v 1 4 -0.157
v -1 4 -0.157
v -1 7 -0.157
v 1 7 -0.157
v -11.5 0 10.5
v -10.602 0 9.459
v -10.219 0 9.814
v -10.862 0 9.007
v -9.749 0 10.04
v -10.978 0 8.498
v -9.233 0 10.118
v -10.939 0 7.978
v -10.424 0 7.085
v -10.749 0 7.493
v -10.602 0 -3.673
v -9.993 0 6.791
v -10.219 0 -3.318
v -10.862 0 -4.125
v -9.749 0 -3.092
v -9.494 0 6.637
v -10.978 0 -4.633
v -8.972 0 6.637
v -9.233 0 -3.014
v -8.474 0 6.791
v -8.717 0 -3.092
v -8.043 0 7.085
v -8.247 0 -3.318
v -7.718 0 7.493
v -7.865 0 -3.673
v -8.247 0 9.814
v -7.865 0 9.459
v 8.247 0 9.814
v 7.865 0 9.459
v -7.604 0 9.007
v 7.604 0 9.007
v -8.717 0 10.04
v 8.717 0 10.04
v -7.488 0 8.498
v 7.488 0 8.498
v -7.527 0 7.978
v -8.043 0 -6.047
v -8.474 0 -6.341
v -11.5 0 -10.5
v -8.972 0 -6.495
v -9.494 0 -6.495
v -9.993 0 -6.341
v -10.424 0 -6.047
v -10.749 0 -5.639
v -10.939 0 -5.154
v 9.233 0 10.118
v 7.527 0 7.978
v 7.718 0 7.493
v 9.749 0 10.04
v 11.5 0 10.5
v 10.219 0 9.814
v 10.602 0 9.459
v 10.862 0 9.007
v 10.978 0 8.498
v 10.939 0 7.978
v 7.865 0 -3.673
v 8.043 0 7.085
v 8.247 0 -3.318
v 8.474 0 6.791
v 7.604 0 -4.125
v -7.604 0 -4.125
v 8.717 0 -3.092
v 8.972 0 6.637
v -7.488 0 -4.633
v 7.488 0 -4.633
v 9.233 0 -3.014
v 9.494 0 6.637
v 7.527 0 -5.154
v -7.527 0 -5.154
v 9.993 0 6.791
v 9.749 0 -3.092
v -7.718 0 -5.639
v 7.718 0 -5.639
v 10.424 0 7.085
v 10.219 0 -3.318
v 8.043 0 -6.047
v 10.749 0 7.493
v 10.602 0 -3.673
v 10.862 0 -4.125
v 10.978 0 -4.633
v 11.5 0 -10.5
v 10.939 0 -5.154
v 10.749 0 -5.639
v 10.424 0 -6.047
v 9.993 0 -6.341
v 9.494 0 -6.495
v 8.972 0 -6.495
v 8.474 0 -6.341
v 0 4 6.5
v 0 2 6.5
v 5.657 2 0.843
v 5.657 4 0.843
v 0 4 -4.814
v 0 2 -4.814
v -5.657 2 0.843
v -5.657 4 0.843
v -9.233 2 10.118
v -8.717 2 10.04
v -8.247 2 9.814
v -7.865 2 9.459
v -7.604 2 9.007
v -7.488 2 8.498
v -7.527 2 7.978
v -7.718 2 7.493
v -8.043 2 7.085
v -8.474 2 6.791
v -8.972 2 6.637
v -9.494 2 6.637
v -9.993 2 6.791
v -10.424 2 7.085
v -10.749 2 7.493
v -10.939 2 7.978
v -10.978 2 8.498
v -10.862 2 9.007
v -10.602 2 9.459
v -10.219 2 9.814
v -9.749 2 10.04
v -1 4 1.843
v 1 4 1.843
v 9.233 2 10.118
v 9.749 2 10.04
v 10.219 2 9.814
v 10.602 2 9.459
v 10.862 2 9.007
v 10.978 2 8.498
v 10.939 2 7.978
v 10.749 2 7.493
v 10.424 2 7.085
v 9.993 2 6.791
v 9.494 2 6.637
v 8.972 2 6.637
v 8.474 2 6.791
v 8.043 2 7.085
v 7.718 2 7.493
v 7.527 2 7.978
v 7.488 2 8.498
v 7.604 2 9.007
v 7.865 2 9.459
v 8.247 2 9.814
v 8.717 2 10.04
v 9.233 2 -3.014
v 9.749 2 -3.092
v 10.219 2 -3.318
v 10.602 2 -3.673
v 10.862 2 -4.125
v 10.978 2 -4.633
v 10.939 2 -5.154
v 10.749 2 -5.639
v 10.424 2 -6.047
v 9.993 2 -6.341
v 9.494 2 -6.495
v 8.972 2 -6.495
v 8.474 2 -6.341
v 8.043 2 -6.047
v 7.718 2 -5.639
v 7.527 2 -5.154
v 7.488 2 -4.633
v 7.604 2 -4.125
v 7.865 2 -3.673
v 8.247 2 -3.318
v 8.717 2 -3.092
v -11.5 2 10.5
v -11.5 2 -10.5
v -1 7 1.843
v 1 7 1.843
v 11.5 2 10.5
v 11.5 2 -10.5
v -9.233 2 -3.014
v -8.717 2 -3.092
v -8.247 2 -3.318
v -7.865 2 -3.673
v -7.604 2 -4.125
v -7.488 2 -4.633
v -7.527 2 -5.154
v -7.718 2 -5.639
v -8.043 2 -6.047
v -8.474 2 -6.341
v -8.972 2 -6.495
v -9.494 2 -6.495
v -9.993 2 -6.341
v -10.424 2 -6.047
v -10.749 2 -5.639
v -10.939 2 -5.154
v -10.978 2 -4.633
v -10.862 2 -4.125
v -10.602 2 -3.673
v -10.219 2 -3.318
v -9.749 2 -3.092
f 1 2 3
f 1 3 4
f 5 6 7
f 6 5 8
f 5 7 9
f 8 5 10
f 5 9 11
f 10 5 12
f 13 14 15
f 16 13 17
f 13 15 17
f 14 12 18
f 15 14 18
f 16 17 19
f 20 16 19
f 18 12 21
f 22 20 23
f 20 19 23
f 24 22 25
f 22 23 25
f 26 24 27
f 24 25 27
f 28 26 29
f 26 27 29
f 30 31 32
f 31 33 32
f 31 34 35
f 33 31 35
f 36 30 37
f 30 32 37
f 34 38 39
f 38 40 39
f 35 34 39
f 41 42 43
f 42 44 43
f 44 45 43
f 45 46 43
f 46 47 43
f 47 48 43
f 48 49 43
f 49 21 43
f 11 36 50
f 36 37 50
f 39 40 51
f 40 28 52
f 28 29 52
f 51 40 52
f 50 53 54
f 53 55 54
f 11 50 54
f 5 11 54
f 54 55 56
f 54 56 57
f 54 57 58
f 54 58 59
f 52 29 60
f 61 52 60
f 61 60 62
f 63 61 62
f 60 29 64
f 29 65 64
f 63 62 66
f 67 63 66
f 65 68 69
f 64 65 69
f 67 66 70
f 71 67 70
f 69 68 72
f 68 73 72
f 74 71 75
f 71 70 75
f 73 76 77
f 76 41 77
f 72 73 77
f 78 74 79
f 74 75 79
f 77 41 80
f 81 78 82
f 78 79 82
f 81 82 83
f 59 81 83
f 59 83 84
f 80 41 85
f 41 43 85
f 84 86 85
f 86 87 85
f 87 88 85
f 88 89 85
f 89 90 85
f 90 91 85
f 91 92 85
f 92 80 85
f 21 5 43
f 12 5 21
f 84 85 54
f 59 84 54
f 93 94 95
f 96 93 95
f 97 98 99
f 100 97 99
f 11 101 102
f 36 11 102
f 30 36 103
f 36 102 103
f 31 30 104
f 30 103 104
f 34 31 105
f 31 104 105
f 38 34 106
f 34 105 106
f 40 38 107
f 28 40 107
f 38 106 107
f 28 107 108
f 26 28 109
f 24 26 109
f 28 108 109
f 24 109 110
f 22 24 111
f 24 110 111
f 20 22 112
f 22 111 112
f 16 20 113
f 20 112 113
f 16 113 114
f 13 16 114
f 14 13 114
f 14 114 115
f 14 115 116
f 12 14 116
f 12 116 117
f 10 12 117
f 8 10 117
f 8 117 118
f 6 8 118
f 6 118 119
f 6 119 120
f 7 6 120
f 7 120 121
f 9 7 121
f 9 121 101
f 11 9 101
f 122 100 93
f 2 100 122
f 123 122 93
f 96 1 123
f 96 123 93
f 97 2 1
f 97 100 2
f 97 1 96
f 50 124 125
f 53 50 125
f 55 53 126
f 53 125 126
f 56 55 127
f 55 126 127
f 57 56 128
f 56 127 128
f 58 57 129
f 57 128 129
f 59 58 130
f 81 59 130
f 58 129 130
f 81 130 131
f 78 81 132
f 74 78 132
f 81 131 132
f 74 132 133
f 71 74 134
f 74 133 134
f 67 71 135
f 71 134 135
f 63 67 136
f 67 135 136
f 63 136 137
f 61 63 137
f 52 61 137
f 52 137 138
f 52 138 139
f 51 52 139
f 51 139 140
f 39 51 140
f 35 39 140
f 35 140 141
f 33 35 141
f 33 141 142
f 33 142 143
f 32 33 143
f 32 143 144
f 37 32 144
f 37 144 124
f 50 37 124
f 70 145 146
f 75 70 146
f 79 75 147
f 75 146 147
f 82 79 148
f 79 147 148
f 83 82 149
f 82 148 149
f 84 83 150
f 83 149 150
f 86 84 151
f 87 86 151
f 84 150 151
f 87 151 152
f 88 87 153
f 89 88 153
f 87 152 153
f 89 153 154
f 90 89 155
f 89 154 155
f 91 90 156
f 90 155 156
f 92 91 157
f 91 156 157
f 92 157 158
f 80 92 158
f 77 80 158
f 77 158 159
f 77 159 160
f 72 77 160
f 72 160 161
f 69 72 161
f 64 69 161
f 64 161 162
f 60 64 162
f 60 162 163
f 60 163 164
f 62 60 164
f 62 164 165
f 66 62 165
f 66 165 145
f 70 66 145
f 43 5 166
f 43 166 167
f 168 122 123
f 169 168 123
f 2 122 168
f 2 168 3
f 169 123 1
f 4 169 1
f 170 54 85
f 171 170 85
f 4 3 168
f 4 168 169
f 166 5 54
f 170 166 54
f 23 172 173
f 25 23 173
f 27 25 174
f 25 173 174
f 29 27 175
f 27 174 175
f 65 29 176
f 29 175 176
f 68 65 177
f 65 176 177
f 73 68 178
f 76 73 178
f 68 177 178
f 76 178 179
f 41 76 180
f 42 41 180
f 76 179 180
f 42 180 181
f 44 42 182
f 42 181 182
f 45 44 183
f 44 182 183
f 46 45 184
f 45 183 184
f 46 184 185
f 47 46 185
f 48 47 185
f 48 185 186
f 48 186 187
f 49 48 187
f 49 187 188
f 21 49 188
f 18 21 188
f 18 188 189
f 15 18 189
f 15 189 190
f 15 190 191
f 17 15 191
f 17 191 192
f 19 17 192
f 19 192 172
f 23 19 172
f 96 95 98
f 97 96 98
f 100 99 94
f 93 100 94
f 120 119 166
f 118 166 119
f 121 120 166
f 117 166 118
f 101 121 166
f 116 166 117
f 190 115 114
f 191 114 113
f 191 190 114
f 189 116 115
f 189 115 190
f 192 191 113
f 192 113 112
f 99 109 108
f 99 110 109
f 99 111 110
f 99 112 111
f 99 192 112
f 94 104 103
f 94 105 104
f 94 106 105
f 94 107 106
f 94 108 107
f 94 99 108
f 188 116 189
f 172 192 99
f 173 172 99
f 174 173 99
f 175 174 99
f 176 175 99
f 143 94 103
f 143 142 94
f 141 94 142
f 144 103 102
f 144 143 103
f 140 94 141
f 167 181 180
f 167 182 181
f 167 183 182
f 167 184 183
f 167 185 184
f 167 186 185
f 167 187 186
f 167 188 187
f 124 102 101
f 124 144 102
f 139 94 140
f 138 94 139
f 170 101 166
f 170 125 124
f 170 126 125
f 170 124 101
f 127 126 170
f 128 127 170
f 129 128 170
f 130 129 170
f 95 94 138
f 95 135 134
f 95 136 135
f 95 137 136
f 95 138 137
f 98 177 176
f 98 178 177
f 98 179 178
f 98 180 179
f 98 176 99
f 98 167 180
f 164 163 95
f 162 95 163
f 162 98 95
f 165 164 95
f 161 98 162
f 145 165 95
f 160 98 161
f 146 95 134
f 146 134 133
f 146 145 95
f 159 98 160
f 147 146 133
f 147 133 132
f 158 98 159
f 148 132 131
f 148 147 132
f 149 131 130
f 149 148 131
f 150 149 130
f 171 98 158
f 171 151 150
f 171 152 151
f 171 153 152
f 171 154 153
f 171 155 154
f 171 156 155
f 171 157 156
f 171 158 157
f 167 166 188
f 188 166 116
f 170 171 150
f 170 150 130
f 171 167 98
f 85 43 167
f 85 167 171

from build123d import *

# Parameters (mm, degrees)
SKETCH1_W           = 23
SKETCH1_H           = 21
BOSS_EXTRUDE1_DEPTH = 2
SKETCH2_R           = 1.75
CUT_EXTRUDE1_DEPTH  = 16.700318468
BOSS_EXTRUDE2_DEPTH = 2
SKETCH4_W           = 2
SKETCH4_H           = 2
BOSS_EXTRUDE3_DEPTH = 3


with BuildPart() as part:
    # Sketch1 → Boss-Extrude1 (new body)
    with BuildSketch(Plane(origin=(0, 0, 0), x_dir=(1, 0, 0), z_dir=(0, 1, 0))):
        Rectangle(SKETCH1_W, SKETCH1_H)
    extrude(amount=BOSS_EXTRUDE1_DEPTH)

    # Sketch2 → Cut-Extrude1 (cut, through all)
    with BuildSketch(Plane(origin=(0, 2, 0), x_dir=(1, 0, 0), z_dir=(0, 1, 0))):
        with Locations(Location((-9.233302989, -8.367680834, 0), (0, 0, 270))):
            Circle(SKETCH2_R)
        with Locations(Location((9.233302989, -8.367680834, 0), (0, 0, 270))):
            Circle(SKETCH2_R)
        with Locations(Location((9.233302989, 4.764127862, 0), (0, 0, 270))):
            Circle(SKETCH2_R)
        with Locations(Location((-9.233302989, 4.764127862, 0), (0, 0, 270))):
            Circle(SKETCH2_R)
    extrude(amount=-CUT_EXTRUDE1_DEPTH, mode=Mode.SUBTRACT)

    # Sketch3 → Boss-Extrude2 (add)
    with BuildSketch(Plane(origin=(0, 2, 0), x_dir=(1, 0, 0), z_dir=(0, 1, 0))):
        Polygon((-5.656854249, -0.843145751), (0, -6.5), (5.656854249, -0.843145751), (0, 4.813708499), align=None)
    extrude(amount=BOSS_EXTRUDE2_DEPTH)

    # Sketch4 → Boss-Extrude3 (add)
    with BuildSketch(Plane(origin=(0, 4, 0), x_dir=(1, 0, 0), z_dir=(0, 1, 0))):
        with Locations((0, -0.843145751)):
            Rectangle(SKETCH4_W, SKETCH4_H)
    extrude(amount=BOSS_EXTRUDE3_DEPTH)


solid = part.part
